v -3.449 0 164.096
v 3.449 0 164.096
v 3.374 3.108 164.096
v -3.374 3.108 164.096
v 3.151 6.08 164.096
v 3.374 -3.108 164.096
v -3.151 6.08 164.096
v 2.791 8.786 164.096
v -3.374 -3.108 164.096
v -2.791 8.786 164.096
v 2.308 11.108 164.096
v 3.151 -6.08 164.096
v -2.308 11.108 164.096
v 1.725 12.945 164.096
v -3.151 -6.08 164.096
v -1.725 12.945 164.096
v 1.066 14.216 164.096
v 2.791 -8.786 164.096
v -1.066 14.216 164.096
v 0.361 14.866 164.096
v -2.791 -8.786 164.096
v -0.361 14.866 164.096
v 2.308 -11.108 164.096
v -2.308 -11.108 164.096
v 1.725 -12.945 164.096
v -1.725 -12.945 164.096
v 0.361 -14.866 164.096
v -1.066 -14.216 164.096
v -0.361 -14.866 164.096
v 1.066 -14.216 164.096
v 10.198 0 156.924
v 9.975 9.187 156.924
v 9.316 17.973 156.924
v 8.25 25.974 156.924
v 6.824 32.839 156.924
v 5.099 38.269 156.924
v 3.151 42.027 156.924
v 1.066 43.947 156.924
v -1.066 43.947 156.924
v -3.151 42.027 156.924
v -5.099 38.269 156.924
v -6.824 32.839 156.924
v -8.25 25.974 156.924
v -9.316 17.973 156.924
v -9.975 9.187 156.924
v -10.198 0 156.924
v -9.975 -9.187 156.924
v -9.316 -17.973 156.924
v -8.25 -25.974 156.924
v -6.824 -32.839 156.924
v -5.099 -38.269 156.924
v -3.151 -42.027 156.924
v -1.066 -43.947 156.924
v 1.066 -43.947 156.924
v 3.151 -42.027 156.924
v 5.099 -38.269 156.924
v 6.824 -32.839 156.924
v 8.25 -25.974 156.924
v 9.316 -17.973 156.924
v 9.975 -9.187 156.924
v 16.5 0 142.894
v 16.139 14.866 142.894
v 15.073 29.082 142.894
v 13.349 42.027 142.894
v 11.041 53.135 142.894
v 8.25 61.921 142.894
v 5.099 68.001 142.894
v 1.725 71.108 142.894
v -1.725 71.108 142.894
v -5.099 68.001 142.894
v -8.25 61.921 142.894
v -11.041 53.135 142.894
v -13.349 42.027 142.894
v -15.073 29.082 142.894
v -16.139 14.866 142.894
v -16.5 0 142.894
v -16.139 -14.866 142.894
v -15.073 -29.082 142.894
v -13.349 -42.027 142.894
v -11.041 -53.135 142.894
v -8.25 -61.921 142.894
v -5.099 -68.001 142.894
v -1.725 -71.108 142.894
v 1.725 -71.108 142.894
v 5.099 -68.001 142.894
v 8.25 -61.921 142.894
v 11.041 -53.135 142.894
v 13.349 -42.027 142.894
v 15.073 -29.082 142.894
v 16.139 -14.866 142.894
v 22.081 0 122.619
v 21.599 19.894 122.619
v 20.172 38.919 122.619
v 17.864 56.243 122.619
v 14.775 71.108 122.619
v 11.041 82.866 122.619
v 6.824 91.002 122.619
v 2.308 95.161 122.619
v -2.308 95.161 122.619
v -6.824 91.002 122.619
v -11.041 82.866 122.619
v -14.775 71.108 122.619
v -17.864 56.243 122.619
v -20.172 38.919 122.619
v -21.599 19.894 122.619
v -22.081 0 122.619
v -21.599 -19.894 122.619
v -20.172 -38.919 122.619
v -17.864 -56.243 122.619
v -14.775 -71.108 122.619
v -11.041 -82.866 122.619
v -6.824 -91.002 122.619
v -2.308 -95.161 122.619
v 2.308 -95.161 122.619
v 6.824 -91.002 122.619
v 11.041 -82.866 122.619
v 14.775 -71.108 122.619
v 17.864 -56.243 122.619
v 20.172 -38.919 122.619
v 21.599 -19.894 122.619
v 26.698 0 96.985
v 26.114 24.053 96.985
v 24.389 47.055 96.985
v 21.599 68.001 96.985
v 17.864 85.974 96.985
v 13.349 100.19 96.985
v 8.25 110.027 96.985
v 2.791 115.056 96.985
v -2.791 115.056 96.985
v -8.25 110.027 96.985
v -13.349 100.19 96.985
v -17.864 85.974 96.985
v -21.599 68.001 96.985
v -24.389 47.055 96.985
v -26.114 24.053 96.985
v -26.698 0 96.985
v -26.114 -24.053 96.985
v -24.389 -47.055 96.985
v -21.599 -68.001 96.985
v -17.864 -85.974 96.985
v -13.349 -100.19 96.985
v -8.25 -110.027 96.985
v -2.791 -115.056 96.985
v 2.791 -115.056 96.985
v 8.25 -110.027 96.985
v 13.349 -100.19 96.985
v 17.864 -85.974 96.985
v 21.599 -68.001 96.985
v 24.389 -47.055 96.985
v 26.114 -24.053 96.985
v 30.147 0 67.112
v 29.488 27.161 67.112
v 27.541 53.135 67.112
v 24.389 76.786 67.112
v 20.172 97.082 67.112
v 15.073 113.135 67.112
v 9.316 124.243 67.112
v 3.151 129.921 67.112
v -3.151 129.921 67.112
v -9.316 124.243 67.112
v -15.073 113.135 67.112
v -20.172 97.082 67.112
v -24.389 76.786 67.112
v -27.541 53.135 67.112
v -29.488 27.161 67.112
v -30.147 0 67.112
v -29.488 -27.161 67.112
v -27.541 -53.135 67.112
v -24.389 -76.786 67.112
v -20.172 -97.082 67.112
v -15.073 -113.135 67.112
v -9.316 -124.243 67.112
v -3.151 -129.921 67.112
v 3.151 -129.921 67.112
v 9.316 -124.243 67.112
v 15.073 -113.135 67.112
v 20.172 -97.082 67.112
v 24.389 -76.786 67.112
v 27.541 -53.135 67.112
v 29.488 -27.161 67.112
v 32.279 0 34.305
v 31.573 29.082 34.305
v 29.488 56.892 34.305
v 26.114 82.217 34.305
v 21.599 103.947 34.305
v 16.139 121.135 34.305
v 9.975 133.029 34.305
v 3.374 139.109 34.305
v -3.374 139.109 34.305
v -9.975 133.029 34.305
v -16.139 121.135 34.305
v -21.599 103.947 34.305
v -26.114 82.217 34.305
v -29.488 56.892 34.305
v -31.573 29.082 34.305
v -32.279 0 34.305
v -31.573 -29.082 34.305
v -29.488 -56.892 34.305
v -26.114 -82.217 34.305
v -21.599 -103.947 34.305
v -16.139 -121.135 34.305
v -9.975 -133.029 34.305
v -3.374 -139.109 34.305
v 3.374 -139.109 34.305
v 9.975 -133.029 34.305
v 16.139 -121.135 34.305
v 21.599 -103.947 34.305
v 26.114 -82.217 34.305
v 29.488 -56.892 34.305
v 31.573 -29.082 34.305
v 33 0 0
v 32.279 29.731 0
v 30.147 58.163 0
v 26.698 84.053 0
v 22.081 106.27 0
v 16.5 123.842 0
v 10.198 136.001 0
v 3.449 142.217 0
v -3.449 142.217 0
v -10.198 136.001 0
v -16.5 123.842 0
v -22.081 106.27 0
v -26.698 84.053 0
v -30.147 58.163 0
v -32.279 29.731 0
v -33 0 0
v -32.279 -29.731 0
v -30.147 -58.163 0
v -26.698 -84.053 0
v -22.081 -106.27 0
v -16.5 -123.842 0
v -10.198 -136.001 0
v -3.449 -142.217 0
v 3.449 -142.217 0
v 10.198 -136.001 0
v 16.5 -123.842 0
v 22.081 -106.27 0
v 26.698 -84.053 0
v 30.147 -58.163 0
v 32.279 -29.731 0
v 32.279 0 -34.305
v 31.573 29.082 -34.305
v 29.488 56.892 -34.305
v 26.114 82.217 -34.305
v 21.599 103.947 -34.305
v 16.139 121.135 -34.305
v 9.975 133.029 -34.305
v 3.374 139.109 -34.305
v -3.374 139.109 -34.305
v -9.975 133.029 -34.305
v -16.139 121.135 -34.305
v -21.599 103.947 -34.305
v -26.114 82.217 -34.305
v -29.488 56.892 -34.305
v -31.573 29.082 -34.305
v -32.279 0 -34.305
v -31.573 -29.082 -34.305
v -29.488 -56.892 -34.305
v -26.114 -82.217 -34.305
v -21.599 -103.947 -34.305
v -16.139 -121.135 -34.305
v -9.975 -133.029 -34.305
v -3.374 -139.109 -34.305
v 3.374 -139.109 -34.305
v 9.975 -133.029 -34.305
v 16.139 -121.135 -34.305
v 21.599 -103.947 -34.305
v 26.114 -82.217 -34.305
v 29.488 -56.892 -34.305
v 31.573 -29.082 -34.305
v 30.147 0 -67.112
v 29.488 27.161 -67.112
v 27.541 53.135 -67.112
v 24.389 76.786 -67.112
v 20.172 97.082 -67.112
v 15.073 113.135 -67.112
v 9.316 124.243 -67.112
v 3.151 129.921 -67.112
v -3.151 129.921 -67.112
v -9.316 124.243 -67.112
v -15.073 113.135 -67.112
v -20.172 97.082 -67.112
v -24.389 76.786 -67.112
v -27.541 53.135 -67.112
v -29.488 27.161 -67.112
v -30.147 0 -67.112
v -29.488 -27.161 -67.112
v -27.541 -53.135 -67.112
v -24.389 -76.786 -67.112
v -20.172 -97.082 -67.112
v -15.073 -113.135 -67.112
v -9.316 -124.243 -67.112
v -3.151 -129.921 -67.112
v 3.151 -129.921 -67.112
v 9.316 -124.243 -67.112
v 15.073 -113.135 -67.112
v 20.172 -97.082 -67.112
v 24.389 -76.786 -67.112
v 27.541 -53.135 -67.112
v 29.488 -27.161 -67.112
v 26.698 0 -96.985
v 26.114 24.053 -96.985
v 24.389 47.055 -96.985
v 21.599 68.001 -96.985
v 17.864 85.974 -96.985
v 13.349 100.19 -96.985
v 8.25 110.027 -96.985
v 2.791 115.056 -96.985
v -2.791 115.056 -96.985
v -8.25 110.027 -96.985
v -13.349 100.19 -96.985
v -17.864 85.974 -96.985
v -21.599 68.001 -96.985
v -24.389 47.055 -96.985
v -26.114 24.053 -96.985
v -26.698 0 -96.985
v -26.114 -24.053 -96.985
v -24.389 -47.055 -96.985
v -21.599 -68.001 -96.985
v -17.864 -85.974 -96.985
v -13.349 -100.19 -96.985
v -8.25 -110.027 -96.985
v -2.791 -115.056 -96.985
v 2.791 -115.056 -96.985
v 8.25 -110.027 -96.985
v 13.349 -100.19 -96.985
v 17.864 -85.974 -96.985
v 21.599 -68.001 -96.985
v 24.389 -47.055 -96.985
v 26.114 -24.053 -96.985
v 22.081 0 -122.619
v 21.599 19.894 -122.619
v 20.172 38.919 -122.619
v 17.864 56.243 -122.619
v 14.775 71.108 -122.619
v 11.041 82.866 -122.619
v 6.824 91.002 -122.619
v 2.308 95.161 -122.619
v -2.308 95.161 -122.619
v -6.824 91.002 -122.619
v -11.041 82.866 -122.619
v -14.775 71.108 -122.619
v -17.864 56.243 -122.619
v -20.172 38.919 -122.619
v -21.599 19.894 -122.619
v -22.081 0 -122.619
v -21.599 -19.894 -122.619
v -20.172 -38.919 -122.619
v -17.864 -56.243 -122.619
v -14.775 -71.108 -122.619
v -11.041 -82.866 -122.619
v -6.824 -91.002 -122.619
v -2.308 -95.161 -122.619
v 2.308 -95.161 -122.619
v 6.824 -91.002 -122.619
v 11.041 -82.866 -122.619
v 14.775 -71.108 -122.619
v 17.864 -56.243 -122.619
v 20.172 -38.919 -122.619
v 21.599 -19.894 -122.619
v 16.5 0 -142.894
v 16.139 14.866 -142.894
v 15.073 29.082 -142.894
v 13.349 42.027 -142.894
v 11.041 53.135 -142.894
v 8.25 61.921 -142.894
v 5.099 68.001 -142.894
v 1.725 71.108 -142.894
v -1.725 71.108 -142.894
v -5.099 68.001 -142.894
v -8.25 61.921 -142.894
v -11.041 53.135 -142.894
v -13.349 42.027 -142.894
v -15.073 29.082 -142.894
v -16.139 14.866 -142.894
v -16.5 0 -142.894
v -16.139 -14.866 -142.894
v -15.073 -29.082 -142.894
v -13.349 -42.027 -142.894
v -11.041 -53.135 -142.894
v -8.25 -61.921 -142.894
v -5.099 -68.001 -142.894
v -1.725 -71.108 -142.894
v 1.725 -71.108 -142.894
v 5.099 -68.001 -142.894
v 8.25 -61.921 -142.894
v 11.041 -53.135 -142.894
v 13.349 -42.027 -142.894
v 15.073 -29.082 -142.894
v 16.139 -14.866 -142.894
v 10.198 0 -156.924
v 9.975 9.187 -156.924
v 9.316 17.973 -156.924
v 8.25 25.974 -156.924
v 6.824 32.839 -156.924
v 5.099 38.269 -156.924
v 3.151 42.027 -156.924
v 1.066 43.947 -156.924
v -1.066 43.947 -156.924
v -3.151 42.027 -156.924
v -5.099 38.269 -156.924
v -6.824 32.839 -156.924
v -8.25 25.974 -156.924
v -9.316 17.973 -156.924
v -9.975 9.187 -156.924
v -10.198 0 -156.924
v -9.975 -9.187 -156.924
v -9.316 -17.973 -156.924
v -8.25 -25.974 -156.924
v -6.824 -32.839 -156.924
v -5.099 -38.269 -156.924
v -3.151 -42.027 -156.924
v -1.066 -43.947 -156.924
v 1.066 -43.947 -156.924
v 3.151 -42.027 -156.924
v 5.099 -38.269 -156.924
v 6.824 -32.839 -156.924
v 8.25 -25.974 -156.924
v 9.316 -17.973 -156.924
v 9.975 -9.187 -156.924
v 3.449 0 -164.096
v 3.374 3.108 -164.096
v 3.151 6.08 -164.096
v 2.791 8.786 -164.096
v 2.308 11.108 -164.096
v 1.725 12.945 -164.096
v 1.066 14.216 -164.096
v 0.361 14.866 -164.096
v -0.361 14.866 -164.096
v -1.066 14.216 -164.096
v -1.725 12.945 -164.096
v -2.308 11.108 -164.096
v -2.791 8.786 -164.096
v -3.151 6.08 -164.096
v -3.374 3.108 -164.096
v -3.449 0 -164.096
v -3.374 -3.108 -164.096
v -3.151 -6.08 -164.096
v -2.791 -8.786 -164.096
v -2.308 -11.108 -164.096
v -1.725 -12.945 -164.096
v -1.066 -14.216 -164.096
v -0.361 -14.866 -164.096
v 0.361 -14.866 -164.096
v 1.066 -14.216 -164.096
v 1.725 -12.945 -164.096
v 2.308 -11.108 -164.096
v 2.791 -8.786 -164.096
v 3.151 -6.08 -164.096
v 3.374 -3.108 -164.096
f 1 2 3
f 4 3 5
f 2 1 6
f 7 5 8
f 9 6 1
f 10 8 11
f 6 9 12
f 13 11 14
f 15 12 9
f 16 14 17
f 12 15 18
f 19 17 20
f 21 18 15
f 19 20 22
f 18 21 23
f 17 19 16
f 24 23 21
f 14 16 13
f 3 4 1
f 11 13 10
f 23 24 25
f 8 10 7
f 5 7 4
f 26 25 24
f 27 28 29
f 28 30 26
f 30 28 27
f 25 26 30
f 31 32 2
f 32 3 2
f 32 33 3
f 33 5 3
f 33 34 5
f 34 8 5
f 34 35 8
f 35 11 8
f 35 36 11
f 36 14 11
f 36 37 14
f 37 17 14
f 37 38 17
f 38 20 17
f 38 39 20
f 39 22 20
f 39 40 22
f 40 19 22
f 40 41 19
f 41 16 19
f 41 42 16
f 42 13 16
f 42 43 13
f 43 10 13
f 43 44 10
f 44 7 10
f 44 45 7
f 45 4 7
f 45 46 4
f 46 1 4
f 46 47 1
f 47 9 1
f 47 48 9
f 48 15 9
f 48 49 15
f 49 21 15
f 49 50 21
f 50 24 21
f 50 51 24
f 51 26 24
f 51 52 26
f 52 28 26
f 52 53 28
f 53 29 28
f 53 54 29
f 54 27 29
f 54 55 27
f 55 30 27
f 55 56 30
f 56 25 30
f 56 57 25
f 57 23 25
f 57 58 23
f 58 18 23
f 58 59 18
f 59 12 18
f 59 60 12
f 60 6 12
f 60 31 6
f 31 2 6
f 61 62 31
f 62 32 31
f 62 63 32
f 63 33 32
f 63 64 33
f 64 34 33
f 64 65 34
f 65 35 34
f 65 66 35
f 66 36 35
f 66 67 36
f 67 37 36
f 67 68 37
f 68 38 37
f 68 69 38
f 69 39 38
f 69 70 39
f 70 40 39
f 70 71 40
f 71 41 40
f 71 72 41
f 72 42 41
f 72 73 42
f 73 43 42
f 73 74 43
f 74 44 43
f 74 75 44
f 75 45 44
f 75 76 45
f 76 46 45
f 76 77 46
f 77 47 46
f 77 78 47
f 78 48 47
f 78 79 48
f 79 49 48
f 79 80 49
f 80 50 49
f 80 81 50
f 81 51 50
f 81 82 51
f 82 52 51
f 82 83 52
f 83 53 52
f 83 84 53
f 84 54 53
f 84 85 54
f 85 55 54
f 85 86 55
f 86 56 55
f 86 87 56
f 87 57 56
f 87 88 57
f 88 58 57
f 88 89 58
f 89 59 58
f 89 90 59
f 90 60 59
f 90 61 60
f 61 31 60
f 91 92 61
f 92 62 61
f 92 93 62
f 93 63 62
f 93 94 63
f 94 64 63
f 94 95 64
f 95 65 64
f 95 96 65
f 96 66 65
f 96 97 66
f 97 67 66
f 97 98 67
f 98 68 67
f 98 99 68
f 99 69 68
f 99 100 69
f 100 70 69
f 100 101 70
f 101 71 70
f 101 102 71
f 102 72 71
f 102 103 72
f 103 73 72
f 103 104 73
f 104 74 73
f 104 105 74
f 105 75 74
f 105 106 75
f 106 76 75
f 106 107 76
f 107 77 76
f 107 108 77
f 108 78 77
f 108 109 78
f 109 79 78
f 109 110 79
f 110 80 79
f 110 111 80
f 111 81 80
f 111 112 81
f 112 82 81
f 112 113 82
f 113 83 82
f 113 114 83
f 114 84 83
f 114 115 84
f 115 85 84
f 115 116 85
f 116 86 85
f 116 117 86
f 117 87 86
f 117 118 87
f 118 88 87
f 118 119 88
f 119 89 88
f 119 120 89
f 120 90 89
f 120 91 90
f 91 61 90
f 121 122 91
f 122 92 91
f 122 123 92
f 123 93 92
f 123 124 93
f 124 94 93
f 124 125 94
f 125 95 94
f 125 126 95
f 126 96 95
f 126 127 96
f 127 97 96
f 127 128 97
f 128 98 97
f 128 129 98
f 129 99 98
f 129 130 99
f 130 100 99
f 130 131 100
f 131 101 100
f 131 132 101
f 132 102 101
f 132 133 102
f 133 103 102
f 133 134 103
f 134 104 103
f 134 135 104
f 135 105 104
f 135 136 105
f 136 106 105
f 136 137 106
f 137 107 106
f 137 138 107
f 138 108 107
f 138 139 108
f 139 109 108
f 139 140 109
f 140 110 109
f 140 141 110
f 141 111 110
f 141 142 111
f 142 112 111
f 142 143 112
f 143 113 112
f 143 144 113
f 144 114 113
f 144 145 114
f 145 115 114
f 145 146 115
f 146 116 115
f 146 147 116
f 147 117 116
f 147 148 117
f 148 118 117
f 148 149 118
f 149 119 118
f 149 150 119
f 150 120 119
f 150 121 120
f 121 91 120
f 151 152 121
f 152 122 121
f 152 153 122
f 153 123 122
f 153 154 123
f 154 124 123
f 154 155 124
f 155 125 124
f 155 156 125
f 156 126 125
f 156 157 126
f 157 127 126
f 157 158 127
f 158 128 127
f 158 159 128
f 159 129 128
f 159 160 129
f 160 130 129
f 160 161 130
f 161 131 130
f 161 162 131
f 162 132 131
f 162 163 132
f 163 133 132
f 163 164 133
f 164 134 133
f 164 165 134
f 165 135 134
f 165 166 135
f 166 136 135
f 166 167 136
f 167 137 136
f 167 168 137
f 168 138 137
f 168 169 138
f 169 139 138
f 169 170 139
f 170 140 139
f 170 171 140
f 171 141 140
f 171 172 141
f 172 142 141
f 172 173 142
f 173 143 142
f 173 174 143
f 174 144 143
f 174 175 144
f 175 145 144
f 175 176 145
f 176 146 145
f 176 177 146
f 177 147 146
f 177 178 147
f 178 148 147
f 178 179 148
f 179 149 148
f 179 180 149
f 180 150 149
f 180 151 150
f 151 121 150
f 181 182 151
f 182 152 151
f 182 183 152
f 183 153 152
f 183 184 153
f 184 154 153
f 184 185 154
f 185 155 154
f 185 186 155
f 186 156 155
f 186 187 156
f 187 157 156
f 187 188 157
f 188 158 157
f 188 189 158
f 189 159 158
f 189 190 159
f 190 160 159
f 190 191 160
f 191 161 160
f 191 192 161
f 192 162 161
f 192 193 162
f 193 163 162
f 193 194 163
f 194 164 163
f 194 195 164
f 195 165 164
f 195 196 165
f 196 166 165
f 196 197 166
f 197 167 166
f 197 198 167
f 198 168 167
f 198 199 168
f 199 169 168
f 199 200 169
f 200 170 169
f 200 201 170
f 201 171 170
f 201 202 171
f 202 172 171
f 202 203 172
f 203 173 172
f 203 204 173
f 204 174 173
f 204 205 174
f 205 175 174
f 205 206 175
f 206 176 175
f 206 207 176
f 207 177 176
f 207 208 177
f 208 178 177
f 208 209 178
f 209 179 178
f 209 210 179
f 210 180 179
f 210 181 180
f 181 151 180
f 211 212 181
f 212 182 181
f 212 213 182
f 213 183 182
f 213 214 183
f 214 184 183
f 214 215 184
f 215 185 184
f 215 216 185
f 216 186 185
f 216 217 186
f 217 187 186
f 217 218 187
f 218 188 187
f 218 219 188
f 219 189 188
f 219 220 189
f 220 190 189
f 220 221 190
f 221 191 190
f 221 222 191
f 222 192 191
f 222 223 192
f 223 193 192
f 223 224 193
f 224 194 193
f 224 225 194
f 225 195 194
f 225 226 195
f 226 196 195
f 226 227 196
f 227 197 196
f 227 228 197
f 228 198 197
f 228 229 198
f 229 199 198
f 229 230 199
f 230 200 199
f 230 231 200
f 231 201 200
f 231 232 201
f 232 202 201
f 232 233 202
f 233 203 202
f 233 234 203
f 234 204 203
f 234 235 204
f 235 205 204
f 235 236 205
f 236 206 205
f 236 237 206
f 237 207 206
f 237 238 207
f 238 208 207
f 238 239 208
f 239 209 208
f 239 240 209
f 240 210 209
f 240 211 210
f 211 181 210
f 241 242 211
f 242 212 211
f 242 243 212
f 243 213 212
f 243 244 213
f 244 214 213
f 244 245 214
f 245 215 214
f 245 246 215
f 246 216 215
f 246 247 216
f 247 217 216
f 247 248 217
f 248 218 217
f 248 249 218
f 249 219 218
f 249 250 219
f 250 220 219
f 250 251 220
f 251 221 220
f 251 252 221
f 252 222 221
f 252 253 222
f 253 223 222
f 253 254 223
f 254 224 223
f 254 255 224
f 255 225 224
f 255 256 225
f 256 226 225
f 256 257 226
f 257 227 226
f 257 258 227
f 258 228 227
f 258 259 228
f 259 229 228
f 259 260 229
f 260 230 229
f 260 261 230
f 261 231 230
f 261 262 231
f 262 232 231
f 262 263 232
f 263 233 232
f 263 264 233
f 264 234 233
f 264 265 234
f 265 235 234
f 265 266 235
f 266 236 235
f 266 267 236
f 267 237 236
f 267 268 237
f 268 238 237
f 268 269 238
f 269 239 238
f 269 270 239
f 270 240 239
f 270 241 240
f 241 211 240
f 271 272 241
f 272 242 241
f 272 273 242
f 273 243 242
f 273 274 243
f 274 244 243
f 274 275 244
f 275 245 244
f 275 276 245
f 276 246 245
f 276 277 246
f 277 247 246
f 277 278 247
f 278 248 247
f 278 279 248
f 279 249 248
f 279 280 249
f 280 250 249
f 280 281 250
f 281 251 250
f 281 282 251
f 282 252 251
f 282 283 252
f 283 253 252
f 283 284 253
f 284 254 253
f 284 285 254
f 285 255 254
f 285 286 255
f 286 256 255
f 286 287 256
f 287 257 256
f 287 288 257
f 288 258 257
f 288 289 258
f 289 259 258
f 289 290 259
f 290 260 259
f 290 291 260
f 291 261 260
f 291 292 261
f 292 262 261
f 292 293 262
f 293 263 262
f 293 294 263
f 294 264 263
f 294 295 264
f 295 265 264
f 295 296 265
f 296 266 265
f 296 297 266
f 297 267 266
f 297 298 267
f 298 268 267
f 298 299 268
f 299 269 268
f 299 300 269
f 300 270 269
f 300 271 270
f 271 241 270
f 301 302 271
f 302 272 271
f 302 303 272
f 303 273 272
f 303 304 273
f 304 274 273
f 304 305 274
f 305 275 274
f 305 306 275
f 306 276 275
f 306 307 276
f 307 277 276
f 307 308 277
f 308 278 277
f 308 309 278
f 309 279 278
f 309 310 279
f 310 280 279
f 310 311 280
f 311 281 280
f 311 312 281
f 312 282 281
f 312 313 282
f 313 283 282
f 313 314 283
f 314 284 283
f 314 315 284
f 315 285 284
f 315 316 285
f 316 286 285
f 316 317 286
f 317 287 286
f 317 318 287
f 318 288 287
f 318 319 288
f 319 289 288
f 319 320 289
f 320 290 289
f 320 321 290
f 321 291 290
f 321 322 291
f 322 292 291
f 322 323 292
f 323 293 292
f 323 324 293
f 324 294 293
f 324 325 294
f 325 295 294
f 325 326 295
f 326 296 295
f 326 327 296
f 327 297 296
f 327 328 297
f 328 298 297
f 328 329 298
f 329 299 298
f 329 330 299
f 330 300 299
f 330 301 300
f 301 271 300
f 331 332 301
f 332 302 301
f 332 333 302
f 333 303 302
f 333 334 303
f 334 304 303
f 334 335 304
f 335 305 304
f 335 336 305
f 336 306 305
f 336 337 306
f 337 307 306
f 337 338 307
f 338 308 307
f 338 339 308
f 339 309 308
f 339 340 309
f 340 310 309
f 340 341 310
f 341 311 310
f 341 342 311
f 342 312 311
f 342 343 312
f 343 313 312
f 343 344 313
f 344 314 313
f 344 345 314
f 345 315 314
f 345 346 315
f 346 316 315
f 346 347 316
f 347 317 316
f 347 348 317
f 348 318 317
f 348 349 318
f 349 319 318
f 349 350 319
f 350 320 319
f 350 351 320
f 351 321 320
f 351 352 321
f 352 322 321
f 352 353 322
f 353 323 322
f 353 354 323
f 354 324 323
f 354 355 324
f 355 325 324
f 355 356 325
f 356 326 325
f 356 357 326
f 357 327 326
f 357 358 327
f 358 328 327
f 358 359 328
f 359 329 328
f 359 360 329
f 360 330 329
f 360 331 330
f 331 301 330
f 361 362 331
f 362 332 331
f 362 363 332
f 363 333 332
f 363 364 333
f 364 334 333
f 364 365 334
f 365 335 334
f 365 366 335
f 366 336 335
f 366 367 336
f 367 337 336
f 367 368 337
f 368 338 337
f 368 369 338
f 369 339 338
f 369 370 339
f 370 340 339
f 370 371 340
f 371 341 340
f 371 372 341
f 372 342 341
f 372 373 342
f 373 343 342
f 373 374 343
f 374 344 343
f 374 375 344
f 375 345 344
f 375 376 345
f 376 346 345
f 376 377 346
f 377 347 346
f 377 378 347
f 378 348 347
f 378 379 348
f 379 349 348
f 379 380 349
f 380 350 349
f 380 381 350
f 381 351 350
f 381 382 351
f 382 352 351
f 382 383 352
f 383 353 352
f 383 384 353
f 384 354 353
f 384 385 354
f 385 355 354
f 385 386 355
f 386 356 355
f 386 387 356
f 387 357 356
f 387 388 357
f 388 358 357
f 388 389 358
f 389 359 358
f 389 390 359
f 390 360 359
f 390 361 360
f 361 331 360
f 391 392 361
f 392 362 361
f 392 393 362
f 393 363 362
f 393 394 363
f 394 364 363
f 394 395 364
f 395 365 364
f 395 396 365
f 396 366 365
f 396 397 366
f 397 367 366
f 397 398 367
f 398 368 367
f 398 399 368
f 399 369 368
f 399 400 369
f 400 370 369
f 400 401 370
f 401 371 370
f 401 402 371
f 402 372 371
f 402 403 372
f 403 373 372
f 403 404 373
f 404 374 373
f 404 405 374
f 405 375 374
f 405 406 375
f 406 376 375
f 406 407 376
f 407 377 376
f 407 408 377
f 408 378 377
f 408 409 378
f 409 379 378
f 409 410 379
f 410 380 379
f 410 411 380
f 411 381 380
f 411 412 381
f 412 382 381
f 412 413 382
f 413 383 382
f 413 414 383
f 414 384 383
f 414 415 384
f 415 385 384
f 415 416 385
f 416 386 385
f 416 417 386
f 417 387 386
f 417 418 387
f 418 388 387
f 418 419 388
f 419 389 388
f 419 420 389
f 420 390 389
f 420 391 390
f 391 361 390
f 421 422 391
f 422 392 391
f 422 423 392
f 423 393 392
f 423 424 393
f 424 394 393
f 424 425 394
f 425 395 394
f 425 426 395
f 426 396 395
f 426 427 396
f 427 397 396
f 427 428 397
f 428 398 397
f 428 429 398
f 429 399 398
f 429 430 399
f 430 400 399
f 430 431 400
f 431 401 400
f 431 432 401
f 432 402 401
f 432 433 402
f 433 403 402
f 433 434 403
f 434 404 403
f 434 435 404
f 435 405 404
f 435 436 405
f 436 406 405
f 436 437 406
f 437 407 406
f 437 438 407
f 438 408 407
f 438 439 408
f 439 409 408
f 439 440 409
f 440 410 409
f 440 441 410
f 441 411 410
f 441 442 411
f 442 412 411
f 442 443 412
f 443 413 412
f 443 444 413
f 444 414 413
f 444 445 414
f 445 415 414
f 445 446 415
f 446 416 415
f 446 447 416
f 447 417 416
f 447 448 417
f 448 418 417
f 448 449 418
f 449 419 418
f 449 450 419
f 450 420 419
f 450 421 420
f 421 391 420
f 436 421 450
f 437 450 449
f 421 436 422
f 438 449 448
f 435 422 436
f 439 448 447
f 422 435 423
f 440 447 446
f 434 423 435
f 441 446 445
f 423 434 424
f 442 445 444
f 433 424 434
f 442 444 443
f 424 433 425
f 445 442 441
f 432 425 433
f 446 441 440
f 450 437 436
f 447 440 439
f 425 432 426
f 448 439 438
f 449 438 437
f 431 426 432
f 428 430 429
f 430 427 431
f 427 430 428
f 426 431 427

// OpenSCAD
// Generated by SolidPython 1.0.1 on 2020-07-29 00:46:45


scale(v = [3, 13, 15]) {
	sphere(r = 11);
}
/***********************************************
*********      SolidPython code:      **********
************************************************
 
# import packages: SolidPython
from solid import *
from solid.utils import *
from itertools import chain, combinations, permutations


class Resize:

    def __init__(self, scad_file):
        self.scad_file = scad_file
        #self.scad_file = import_scad(scad_file)
        # cone/cylinder param:
        self.r1 = 0
        self.r2 = 0
        self.h = 0
        # rectangular prism param:
        self.w = 0
        self.l = 0
        # ellipse param:
        self.r = 0

    # import OpenScad code (file name corresponds to shape)


    # classify shape + parameters
    def assign(self, param1, param2, param3):
        if self.scad_file == 'cone.scad':
            self.r1 = param1
            self.r2 = param2
            self.h = param3
        elif self.scad_file == 'cylinder.scad':
            self.r1 = param1
            self.r2 = param2
            self.h = param3
        elif self.scad_file == 'rectangularPrism.scad':
            self.h = param1
            self.l = param2
            self.w = param3
        else:
            self.r = param1
            self.h = param2

    # resize parameters
    def iterate(self):
        x = range(3, 20, 2)
        i = 1
        if self.scad_file == 'cone.scad':
            tempList = list(permutations(x, 2))
            for temp in tempList:
                param1 = temp[0]
                param2 = temp[1]
                filepath = 'produced_scad_files/' + 'cone' + str(param1) + '_' + str(param2) + '_' + '.scad'
                scad_render_to_file(cylinder(h=param1, r1=param2, r2=0), filepath)

        elif self.scad_file == 'cylinder.scad':
            tempList = list(permutations(x, 3))
            for temp in tempList:
                param1 = temp[0]
                param2 = temp[1]
                filepath = 'produced_scad_files/' + 'cylinder' + str(param1) + '_' + str(param2) + '_' + '.scad'
                scad_render_to_file(cylinder(h=param1, r1=param2, r2=param2), filepath)

        elif self.scad_file == 'rectangularPrism.scad':
            tempList = list(permutations(x, 3))
            for temp in tempList:
                param1 = temp[0]
                param2 = temp[1]
                param3 = temp[2]
                filepath = 'produced_scad_files/' + 'rectangularPrism' + str(param1) + '_' + str(param2) + '_' + str(
                    param3) + '.scad'
                scad_render_to_file(cube(size=(param1, param2, param3)), filepath)

        elif self.scad_file == 'ellipse.scad':
            tempList = list(permutations(x, 4))
            for temp in tempList:
                param1 = temp[0]
                param2 = temp[1]
                param3 = temp[2]
                param4 = temp[3]
                filepath = 'produced_scad_files/' + 'ellipse' + str(param1) + '_' + str(param2) + '_' + str(param3) + '_' + str(param4) + '.scad'
                scad_render_to_file(scale([param1, param2, param3])(sphere(r=param4)), filepath)

    def render_to_scadfile(self):
        scad_render_to_file(scad, 'example.scad') 
 
************************************************/
